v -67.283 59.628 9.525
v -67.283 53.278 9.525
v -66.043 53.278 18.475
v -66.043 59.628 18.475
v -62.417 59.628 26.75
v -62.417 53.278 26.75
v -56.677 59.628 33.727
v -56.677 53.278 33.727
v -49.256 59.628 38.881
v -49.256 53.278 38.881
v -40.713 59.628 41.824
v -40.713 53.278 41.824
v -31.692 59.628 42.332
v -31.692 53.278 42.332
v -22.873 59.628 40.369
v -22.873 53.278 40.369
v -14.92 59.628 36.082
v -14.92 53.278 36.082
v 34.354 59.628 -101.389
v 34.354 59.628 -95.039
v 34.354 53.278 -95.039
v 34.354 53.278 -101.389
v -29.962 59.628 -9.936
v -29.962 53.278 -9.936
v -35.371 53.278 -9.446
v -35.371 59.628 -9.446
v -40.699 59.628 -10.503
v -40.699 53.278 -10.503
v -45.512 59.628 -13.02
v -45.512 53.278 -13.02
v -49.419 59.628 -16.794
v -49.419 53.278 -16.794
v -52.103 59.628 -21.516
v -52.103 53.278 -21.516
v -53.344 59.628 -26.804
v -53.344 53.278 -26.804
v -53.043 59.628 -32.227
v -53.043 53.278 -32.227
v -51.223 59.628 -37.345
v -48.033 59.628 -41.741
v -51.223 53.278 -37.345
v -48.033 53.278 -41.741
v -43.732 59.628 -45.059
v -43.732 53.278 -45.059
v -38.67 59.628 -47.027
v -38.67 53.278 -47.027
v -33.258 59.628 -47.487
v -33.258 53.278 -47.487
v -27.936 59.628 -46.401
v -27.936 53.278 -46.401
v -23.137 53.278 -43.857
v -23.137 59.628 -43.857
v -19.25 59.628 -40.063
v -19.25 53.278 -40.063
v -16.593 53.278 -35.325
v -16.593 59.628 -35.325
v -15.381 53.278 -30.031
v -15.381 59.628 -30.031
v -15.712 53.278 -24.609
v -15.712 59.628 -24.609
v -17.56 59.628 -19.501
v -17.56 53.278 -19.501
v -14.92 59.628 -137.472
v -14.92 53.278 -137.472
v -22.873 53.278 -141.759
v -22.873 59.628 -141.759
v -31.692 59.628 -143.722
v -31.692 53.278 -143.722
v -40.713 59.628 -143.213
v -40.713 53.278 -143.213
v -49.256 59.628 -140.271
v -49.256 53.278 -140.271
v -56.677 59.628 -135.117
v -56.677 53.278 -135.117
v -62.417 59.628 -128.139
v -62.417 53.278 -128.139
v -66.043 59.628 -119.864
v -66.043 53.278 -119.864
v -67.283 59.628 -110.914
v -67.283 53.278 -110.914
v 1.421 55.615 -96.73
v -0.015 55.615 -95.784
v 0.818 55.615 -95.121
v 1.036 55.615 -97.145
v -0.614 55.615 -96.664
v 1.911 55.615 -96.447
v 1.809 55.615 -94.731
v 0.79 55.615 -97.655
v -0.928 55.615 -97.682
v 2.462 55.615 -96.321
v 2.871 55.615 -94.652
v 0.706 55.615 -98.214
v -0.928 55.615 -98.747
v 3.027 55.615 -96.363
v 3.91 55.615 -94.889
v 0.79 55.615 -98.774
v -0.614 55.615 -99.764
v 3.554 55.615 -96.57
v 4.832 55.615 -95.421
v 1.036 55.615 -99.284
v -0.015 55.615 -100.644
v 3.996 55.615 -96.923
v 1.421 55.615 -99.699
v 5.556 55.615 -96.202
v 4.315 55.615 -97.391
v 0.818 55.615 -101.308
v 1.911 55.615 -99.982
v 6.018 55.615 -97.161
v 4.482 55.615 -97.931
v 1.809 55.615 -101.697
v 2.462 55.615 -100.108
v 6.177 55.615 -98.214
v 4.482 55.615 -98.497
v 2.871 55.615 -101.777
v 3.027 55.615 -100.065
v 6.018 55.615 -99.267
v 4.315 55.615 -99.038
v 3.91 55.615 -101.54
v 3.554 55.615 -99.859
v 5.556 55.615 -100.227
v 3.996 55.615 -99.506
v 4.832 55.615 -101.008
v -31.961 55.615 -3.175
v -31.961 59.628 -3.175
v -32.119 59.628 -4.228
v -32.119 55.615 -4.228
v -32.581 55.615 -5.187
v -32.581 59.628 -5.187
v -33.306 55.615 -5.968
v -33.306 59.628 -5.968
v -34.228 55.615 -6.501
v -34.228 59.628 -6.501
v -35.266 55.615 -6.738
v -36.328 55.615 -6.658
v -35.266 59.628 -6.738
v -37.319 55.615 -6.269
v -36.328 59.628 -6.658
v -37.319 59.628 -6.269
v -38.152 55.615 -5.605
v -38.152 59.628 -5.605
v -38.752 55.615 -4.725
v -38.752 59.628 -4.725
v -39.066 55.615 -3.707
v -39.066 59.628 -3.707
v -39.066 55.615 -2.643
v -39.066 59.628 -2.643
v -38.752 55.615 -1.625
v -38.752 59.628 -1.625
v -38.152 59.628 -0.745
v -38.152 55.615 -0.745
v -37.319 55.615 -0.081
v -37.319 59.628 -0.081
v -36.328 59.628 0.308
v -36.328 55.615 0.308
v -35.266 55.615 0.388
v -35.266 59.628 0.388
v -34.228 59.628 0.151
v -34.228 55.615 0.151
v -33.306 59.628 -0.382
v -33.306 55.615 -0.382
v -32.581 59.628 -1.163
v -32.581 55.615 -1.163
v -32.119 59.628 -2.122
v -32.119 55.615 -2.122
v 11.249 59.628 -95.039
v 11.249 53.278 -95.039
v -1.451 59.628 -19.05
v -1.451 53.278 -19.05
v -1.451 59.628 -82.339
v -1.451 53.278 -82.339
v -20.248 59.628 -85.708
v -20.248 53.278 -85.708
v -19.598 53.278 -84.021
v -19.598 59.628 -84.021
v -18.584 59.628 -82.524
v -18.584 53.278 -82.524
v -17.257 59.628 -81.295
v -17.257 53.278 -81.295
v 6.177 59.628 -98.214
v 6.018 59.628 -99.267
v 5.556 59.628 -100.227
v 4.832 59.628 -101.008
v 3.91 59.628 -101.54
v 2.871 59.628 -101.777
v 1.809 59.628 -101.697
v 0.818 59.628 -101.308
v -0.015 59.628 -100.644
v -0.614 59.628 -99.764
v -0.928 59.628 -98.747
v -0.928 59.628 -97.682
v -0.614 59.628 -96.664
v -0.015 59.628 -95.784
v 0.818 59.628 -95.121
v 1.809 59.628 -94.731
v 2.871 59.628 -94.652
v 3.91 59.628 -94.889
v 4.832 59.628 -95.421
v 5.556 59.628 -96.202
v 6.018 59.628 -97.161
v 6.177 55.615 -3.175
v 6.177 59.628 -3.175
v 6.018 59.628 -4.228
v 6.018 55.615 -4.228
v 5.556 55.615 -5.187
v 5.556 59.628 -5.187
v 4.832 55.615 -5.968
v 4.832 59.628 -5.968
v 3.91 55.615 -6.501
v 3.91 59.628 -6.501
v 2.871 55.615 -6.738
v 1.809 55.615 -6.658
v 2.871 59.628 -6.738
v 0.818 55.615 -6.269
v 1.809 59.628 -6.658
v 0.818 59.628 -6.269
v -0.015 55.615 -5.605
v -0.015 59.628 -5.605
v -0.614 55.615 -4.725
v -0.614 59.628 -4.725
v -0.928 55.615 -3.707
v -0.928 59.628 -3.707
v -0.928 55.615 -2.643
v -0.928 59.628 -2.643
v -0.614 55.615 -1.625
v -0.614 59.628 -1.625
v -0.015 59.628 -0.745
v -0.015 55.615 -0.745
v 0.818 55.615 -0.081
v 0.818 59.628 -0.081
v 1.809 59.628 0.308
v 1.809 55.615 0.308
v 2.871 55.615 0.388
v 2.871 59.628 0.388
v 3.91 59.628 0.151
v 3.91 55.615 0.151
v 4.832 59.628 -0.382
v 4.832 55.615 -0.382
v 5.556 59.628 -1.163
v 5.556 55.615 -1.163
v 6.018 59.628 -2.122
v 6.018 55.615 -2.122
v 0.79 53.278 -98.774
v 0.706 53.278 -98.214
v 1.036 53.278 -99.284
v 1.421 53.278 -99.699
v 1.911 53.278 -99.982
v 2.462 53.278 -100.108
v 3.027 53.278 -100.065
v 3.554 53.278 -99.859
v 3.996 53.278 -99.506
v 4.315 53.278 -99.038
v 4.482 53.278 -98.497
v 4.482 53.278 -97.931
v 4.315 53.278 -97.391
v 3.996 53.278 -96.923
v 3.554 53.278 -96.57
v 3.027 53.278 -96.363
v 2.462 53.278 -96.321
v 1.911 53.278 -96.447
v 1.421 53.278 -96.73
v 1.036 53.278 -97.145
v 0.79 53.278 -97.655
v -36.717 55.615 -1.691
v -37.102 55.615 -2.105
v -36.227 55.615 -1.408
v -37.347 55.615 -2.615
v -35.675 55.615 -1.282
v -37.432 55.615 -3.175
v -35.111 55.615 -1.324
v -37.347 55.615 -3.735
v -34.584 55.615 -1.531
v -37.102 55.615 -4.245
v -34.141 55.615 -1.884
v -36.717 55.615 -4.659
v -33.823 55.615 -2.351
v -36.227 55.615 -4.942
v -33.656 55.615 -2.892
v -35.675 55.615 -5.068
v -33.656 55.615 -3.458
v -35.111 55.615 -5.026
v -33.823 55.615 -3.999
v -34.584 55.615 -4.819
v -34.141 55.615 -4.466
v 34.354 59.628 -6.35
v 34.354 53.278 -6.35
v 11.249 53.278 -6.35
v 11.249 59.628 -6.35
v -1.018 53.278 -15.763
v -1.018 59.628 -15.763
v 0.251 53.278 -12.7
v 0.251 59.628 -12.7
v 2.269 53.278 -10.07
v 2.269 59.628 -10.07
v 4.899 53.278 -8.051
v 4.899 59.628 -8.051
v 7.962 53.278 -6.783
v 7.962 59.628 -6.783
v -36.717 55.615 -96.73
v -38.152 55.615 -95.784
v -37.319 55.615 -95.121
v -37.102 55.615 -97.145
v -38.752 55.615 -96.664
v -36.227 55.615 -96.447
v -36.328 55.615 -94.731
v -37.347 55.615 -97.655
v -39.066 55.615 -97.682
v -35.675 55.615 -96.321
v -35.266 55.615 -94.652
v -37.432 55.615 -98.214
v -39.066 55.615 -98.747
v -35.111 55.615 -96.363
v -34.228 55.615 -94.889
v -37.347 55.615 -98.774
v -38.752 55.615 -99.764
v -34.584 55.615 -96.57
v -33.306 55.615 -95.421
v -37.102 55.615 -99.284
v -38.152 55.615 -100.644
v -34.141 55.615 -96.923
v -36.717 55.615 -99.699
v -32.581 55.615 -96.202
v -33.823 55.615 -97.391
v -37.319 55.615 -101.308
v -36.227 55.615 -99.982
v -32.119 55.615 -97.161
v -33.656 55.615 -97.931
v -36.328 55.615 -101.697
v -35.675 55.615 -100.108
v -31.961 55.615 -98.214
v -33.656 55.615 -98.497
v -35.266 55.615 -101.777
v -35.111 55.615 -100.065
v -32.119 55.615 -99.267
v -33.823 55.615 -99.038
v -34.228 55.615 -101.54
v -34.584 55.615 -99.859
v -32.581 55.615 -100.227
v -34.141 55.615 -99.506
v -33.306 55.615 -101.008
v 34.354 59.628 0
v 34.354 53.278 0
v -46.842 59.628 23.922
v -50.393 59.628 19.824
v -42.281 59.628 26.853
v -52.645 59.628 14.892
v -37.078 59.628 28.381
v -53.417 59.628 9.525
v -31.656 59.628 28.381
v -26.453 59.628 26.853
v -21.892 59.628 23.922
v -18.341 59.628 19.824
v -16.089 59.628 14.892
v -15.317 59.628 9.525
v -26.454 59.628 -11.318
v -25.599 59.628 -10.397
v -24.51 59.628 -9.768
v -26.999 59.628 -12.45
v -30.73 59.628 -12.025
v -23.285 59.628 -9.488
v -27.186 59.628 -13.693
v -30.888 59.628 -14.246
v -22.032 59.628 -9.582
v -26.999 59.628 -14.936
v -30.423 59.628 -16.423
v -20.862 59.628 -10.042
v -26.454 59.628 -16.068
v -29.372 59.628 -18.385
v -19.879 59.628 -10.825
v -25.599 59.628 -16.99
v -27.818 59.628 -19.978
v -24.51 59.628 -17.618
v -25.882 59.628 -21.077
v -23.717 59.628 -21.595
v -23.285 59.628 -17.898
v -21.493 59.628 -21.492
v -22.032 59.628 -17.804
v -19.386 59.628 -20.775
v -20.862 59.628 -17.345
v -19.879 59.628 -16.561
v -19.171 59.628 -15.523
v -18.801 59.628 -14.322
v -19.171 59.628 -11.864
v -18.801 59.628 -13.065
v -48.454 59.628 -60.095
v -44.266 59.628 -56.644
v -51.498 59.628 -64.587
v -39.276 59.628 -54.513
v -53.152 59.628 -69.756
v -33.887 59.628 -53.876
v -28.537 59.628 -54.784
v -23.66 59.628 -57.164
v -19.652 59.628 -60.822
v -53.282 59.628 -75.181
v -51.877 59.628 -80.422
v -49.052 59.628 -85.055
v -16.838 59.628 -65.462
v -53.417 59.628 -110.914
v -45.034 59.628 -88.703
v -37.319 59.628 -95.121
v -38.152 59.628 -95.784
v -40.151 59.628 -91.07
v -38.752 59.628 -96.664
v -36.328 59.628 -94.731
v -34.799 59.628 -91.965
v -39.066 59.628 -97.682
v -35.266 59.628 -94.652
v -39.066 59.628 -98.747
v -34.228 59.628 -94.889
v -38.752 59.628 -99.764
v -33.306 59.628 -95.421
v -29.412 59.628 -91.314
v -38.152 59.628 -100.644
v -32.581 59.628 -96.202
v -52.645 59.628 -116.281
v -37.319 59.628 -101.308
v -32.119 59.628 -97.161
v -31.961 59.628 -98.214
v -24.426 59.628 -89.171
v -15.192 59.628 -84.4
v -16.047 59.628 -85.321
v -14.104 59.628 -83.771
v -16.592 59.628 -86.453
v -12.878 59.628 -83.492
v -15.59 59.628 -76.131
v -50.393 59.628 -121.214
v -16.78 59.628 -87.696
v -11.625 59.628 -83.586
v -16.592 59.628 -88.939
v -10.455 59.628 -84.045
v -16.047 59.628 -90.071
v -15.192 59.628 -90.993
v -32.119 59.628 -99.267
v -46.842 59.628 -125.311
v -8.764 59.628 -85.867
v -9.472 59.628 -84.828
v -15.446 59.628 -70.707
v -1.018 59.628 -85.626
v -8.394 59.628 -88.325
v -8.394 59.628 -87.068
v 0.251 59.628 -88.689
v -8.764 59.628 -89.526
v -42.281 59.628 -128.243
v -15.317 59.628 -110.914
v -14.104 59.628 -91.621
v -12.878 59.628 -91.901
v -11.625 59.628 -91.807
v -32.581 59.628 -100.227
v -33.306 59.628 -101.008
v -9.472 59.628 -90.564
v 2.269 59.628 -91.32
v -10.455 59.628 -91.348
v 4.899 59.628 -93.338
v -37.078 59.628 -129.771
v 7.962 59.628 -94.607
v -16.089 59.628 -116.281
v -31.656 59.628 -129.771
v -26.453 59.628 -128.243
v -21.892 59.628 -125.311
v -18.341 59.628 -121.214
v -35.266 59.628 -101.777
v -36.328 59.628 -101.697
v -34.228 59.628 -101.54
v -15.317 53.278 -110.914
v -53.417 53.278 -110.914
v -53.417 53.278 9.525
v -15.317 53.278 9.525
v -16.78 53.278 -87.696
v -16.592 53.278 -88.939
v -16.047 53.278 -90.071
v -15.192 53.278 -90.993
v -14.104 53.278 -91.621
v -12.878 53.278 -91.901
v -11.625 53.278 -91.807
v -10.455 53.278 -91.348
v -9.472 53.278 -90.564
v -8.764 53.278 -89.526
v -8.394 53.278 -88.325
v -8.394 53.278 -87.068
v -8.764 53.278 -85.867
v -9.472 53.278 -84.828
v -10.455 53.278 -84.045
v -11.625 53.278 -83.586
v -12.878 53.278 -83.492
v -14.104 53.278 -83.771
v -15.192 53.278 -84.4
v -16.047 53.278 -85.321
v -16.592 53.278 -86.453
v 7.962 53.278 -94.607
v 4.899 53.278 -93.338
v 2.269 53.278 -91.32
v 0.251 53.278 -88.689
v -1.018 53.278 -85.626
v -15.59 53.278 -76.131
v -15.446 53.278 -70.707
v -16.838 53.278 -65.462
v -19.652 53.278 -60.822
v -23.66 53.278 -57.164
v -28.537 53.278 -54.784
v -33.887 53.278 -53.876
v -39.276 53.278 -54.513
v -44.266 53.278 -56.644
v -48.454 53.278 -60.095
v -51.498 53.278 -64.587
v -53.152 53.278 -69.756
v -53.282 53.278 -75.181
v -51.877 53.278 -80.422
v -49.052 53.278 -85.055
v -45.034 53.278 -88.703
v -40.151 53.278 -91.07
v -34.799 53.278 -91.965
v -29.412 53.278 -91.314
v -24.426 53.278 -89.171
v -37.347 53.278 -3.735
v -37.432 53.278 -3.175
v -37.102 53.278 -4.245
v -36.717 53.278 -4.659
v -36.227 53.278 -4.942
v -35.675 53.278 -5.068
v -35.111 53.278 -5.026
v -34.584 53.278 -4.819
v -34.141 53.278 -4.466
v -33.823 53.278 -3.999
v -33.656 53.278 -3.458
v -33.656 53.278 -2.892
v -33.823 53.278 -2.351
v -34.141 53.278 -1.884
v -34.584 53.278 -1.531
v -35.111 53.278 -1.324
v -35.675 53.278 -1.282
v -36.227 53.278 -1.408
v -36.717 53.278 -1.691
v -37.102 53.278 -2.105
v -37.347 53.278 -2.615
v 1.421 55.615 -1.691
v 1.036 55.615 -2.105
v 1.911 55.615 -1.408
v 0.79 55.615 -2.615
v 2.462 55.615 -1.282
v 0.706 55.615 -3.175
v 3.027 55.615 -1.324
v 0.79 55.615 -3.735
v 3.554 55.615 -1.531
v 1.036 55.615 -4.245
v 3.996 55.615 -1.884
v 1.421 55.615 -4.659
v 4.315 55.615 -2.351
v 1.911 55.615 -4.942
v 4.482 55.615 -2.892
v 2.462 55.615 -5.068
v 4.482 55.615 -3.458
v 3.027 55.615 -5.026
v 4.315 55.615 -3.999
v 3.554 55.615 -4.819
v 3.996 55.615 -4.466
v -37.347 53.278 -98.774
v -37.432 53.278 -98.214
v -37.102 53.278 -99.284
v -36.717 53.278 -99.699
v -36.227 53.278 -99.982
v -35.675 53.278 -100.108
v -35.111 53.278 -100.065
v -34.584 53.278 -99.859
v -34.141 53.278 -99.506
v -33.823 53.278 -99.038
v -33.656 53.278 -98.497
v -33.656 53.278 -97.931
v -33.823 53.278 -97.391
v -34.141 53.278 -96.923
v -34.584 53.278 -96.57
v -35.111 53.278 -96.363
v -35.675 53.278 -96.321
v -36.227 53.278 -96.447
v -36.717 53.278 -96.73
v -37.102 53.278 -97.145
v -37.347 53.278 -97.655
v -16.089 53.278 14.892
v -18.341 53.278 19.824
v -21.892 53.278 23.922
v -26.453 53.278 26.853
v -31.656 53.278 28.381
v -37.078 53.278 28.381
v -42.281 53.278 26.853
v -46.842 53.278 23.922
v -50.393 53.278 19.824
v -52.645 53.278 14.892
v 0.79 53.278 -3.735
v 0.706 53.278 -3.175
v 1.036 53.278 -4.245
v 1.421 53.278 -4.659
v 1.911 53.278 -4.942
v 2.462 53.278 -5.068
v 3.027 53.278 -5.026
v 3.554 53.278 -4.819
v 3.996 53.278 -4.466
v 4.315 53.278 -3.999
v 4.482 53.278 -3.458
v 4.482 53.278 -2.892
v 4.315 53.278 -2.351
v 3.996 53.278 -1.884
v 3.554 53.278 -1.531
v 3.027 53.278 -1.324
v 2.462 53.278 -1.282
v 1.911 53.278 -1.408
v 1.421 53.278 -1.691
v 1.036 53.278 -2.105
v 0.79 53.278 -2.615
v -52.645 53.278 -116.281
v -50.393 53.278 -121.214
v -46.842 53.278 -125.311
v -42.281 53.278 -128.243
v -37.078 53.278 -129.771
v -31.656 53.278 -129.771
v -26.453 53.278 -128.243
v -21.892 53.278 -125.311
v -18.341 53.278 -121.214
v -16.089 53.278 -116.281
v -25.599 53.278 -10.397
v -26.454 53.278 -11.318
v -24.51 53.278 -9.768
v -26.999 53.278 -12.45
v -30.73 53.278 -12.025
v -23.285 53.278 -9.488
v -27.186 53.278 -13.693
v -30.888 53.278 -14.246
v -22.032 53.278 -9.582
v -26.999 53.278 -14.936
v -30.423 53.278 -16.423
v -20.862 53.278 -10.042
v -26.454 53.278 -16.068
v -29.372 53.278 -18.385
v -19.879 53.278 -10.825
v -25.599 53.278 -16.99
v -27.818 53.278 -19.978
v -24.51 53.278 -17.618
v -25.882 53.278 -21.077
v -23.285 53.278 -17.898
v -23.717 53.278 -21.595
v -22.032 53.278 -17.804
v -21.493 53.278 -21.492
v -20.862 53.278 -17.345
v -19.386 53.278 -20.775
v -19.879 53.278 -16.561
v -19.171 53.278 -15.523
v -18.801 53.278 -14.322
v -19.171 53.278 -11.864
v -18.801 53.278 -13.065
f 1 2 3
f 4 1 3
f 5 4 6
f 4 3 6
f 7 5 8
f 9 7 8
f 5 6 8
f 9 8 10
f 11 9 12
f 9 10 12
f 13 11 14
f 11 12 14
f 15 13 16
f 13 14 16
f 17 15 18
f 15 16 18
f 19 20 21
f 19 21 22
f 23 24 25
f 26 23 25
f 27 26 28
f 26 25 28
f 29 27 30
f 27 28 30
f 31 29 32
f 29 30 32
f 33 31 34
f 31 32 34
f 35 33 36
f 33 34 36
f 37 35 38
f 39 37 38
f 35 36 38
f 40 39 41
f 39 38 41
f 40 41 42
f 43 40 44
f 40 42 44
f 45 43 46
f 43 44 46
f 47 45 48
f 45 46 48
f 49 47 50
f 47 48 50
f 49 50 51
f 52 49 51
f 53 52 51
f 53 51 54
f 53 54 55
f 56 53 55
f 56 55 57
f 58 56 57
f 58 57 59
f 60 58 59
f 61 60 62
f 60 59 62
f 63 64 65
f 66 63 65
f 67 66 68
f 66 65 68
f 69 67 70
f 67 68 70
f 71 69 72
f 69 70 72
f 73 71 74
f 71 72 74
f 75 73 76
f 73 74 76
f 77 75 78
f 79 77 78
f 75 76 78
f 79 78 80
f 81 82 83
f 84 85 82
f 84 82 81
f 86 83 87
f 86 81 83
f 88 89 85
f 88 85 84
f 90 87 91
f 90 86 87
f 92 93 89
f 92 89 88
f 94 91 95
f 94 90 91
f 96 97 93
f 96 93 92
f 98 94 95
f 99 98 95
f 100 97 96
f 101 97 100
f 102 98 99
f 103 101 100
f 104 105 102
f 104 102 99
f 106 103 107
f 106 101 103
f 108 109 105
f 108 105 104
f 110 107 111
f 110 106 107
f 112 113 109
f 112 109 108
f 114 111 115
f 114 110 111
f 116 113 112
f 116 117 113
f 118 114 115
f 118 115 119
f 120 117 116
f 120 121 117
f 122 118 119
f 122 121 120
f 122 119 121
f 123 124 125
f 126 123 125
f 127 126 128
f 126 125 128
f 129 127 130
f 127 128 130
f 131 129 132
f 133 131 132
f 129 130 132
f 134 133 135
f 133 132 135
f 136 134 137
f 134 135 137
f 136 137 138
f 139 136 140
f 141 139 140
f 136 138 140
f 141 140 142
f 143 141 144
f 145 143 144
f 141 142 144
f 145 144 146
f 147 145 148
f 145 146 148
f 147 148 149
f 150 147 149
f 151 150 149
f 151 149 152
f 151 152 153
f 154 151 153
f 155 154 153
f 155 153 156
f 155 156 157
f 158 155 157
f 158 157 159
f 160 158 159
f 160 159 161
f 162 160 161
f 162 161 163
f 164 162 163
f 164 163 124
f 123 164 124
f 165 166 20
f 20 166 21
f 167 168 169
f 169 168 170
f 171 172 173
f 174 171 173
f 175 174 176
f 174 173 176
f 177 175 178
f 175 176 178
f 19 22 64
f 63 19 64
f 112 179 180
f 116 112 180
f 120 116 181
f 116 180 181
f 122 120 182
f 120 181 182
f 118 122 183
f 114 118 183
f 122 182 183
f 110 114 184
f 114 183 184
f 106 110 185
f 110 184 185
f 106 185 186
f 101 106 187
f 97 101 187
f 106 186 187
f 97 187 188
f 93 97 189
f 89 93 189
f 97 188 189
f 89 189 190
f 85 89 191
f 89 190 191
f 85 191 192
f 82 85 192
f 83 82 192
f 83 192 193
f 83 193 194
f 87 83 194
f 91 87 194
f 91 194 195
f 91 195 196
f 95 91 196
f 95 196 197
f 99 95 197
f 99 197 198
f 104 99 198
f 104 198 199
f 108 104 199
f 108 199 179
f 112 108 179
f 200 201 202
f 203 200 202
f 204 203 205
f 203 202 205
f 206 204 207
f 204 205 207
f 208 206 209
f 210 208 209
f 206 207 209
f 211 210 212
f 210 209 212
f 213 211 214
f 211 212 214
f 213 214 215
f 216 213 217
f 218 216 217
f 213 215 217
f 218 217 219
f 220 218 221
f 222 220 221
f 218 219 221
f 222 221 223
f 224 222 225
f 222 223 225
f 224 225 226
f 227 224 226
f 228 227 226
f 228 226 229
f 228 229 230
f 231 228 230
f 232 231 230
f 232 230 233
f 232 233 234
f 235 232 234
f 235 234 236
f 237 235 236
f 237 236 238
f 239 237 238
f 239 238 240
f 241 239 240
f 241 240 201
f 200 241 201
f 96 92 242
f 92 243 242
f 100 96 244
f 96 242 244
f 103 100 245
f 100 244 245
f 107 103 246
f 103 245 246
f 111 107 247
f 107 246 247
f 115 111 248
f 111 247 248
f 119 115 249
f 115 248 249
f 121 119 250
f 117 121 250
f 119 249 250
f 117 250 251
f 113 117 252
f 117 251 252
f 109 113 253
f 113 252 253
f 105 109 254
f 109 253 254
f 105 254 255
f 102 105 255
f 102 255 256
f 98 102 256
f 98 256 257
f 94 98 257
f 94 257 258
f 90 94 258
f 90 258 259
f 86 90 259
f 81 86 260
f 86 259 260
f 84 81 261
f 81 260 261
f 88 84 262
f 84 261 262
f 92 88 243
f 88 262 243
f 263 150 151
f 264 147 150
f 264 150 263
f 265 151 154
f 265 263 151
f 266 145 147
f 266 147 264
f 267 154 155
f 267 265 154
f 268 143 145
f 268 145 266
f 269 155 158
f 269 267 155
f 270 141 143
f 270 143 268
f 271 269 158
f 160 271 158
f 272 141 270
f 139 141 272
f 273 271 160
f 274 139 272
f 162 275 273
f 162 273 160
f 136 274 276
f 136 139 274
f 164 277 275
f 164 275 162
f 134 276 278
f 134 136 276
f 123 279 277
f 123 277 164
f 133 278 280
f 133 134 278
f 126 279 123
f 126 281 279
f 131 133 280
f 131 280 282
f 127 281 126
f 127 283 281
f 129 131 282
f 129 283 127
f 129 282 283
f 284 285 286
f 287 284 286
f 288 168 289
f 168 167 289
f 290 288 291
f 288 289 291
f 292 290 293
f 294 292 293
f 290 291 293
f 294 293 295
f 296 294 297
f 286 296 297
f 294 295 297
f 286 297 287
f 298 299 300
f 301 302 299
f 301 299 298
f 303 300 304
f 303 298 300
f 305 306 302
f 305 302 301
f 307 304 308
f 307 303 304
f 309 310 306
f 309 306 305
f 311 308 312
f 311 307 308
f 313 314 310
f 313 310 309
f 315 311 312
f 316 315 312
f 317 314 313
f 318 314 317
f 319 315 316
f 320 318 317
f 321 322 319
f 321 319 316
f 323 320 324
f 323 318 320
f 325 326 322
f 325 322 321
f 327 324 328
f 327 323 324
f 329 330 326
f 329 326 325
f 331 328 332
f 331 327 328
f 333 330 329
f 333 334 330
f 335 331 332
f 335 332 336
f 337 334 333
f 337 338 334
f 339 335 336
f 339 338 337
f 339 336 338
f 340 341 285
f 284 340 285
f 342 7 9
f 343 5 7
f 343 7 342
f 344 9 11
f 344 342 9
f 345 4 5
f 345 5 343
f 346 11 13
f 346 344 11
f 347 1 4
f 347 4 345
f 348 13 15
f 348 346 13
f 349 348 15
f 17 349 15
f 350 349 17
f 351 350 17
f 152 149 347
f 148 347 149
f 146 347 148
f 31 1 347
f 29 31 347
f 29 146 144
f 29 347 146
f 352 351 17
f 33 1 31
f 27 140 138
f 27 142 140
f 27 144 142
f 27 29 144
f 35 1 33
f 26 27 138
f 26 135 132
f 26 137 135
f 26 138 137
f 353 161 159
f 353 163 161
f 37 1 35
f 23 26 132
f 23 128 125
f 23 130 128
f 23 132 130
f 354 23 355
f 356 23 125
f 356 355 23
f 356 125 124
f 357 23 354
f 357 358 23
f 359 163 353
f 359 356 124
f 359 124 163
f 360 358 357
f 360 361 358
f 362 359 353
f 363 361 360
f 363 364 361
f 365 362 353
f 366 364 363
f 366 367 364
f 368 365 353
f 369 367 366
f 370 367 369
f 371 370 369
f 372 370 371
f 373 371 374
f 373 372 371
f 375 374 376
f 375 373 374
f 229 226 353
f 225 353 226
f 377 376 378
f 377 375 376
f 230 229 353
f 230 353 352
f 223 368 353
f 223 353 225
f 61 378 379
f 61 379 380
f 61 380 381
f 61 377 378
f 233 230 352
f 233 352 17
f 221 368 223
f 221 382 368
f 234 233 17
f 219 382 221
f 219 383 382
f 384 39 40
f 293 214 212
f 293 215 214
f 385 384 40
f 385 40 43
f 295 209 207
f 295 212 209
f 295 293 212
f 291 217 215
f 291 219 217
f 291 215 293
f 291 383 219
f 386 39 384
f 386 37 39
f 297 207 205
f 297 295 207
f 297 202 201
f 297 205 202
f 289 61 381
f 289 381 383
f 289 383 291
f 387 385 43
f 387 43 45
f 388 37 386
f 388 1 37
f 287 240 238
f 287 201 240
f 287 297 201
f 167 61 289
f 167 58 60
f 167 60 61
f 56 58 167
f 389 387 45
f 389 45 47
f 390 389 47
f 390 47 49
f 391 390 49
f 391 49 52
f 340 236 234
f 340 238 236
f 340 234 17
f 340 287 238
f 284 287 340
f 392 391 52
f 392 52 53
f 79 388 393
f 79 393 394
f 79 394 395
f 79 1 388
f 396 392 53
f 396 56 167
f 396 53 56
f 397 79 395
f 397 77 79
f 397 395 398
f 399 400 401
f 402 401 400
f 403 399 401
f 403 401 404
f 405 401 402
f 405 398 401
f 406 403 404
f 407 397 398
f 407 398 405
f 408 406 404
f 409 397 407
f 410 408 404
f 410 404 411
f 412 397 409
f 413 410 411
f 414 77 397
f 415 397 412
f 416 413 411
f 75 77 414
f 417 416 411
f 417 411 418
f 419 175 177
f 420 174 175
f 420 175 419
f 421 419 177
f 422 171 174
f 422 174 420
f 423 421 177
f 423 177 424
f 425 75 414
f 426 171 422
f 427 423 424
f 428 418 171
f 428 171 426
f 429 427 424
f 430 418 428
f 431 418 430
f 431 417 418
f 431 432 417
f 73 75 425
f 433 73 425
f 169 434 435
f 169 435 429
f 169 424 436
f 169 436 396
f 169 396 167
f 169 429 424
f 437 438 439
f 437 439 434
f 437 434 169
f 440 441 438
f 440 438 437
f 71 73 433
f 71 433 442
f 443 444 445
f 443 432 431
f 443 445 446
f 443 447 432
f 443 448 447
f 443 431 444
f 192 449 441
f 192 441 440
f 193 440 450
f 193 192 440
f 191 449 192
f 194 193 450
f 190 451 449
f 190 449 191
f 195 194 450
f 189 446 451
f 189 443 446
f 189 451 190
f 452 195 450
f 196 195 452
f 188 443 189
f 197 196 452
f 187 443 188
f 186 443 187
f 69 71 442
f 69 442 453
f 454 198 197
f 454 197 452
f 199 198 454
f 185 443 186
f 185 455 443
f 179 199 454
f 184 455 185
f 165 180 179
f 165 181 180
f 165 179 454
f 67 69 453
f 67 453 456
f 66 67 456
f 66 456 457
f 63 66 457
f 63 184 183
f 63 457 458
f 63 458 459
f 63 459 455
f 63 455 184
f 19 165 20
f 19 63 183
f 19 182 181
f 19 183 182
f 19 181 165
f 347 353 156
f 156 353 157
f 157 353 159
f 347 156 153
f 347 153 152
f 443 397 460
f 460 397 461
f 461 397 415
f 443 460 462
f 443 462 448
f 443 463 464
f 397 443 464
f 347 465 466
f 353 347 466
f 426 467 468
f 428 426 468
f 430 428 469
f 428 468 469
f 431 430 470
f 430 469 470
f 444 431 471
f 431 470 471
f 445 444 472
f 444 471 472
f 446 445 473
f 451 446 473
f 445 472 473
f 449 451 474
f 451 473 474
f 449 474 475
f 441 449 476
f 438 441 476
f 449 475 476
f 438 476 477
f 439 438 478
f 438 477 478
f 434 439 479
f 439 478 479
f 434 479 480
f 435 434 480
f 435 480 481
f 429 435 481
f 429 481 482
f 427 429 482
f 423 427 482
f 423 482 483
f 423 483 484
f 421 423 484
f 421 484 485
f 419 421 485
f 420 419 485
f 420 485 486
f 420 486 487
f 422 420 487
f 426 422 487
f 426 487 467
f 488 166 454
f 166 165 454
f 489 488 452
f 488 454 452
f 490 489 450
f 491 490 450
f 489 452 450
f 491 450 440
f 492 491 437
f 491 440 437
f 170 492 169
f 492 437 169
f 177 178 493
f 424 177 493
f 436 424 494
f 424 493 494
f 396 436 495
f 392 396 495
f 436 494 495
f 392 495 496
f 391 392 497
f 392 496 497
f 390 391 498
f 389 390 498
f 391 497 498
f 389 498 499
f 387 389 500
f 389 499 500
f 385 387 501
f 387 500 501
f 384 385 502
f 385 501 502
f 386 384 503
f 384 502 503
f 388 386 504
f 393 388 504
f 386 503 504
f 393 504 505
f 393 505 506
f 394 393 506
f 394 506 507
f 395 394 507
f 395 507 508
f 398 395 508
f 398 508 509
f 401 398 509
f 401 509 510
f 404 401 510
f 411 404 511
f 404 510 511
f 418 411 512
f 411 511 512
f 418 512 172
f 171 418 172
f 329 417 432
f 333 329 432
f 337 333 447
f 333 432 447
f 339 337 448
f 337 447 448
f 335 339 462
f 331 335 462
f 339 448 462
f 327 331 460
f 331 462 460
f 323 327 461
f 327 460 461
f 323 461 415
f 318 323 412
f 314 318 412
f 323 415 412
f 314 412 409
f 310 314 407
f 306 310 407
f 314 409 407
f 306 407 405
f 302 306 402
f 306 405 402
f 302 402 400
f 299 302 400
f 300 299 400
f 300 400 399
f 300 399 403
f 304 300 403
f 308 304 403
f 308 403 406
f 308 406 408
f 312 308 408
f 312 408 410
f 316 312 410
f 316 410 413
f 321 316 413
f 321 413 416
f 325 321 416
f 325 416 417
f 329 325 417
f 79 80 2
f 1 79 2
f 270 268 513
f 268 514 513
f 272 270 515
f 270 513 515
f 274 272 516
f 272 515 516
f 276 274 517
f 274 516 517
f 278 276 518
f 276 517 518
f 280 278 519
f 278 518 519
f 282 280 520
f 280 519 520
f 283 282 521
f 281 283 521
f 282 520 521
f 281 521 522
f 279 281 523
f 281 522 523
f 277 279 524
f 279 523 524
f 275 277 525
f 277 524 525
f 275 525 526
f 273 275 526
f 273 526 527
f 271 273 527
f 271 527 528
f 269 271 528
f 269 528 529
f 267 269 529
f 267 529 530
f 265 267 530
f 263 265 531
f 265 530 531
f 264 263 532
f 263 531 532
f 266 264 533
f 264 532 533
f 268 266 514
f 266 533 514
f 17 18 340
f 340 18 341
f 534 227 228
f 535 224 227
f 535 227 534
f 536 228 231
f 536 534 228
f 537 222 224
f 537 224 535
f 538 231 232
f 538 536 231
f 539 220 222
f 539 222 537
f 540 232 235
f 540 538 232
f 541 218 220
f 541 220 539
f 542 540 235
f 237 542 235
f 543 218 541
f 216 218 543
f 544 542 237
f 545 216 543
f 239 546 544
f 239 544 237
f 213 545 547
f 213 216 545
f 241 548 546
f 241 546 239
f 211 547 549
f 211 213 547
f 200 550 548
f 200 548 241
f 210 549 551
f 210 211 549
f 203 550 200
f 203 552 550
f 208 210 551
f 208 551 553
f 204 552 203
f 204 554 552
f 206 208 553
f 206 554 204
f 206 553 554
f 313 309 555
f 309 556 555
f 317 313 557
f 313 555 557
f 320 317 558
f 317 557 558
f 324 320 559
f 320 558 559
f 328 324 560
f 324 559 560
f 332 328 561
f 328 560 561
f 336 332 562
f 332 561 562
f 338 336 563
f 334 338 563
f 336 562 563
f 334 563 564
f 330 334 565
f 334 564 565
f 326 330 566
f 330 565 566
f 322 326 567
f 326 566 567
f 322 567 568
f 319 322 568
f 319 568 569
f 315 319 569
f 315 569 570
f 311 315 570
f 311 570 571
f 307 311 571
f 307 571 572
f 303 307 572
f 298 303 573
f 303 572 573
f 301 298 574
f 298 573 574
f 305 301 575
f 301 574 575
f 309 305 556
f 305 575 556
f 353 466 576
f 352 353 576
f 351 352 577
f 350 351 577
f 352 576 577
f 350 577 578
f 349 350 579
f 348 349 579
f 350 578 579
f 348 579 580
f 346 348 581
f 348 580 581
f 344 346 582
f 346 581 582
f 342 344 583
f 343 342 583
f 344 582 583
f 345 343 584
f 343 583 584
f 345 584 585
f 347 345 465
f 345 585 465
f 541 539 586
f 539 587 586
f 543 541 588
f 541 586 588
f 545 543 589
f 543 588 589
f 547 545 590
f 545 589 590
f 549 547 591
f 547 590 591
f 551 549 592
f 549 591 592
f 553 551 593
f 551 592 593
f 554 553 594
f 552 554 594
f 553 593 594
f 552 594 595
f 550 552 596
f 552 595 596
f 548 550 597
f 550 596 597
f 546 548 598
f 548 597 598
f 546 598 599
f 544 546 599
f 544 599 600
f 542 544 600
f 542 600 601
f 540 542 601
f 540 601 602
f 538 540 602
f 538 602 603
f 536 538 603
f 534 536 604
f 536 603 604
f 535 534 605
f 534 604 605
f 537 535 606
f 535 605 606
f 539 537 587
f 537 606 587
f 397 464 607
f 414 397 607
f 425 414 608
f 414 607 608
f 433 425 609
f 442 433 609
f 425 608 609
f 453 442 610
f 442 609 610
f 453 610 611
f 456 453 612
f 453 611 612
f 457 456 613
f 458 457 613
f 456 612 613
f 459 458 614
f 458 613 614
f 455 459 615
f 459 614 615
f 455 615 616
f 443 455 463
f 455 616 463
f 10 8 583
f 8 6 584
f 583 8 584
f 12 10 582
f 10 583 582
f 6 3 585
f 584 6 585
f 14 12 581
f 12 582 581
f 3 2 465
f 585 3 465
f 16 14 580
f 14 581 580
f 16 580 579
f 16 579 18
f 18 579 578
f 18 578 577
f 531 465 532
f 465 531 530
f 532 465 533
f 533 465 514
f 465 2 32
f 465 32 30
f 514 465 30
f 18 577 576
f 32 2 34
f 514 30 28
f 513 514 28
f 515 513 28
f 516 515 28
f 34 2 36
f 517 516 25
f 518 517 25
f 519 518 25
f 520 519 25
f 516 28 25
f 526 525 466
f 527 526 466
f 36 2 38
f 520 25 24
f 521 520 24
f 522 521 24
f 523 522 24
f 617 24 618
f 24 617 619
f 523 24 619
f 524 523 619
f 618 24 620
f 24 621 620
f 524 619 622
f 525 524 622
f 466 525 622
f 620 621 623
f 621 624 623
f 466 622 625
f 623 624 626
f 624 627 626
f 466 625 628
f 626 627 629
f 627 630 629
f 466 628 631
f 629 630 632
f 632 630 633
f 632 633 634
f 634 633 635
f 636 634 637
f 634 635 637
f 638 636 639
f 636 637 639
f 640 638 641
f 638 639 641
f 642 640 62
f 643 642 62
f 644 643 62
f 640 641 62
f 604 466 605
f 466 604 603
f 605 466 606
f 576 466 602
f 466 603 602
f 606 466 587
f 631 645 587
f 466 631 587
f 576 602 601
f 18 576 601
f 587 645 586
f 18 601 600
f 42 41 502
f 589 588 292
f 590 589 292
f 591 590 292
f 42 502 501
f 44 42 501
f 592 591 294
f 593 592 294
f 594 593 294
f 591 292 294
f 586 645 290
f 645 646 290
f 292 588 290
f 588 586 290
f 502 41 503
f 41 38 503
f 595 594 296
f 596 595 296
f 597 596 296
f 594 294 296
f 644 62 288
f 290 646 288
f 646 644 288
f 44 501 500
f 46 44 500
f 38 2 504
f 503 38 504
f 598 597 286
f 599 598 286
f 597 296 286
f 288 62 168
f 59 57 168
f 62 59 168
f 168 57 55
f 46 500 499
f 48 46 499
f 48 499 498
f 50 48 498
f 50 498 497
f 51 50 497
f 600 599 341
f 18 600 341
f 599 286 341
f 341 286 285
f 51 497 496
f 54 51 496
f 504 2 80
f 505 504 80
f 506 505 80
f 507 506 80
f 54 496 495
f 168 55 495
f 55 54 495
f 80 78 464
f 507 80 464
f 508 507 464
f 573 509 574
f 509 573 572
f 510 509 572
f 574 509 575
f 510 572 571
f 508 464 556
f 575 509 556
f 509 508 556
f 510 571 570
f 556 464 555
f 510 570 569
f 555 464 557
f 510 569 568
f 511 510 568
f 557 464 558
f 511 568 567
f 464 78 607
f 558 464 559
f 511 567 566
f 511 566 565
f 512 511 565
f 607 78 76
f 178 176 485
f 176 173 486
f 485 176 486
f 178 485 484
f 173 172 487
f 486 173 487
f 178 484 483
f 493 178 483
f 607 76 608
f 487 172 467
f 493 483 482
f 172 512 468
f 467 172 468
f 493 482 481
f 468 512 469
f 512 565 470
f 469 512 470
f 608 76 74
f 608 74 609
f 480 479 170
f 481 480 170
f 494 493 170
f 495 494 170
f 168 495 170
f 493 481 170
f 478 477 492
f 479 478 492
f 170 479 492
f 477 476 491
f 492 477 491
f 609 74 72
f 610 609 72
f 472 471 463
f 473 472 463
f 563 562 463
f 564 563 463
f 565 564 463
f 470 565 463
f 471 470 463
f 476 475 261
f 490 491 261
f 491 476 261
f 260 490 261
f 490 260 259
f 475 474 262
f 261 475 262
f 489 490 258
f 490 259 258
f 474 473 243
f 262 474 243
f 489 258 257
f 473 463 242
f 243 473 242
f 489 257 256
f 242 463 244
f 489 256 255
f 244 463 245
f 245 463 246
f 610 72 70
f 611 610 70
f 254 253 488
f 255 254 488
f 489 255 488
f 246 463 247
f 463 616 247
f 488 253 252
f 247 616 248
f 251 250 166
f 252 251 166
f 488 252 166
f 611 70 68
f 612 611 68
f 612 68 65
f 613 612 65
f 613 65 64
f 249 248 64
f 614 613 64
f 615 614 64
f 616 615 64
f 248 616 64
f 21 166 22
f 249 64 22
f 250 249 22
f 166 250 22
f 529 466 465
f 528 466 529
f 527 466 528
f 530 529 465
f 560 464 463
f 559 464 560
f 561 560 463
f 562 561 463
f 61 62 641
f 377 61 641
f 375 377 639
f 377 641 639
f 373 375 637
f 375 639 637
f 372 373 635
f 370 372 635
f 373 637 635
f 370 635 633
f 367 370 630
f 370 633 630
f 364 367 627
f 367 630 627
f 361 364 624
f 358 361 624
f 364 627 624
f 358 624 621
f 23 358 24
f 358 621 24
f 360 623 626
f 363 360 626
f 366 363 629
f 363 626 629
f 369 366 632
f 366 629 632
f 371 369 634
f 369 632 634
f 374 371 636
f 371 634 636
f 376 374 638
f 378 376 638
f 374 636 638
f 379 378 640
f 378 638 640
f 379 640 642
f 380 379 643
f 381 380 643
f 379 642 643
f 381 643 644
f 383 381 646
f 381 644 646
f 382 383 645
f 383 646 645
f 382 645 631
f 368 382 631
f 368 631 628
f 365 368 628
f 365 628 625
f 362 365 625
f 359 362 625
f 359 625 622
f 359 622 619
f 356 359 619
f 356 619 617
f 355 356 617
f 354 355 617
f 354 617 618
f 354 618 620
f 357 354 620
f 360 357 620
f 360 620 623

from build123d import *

# Parameters (mm, degrees)
BOSS_EXTRUDE1_DEPTH                            = 6.35
FILLET1_R                                      = 12.7
TAP_DRILL_FOR_3_8_24_TAP1_D                    = 8.4328
CBORE_FOR_6_SOCKET_HEAD_CAP_SCREW1_D           = 3.7973
CBORE_FOR_6_SOCKET_HEAD_CAP_SCREW1_CBORE_D     = 7.14502
CBORE_FOR_6_SOCKET_HEAD_CAP_SCREW1_CBORE_DEPTH = 4.0132


with BuildPart() as part:
    # Sketch1 → Boss-Extrude1 (new body)
    with BuildSketch(Plane(origin=(0, 53.278467802, 0), x_dir=(1, 0, 0), z_dir=(0, 1, 0))):
        with BuildLine():
            ThreePointArc((-14.919754069, 137.471595351), (-49.255675468, 140.270872374), (-67.283137827, 110.914407139))
            Line((-67.283137827, 110.914407139), (-67.283137827, -9.525))
            ThreePointArc((-67.283137827, -9.525), (-49.255676138, -38.881464895), (-14.919755281, -36.0821891))
            Line((-14.919755281, -36.0821891), (34.354322218, 0))
            Line((34.354322218, 0), (34.354322218, 6.35))
            Line((34.354322218, 6.35), (-1.450719122, 6.35))
            Line((-1.450719122, 6.35), (-1.450719122, 95.039403682))
            Line((-1.450719122, 95.039403682), (34.354322218, 95.039403682))
            Line((34.354322218, 95.039403682), (34.354322218, 101.389403682))
            Line((34.354322218, 101.389403682), (-14.919754069, 137.471595351))
        make_face()
        with BuildLine():
            Line((-53.416928475, -9.525), (-34.366928475, -9.525))
            Line((-34.366928475, -9.525), (-15.316928475, -9.525))
            ThreePointArc((-15.316928475, -9.525), (-34.366928475, -28.575), (-53.416928475, -9.525))
        make_face(mode=Mode.SUBTRACT)
        with BuildLine():
            ThreePointArc((-29.961916932, 9.935994461), (-46.001401892, 43.554183286), (-17.560004644, 19.501436661))
            ThreePointArc((-17.560004644, 19.501436661), (-27.817615961, 19.978303209), (-29.961916932, 9.935994461))
        make_face(mode=Mode.SUBTRACT)
        with BuildLine():
            ThreePointArc((-17.256926776, 81.295283661), (-50.136649325, 62.232402493), (-20.247770765, 85.708444148))
            ThreePointArc((-20.247770765, 85.708444148), (-19.133936144, 83.24325824), (-17.256926776, 81.295283661))
        make_face(mode=Mode.SUBTRACT)
        with BuildLine():
            Line((-34.366928475, 110.914407139), (-53.416928475, 110.914407139))
            ThreePointArc((-53.416928475, 110.914407139), (-34.366928475, 129.964407139), (-15.316928475, 110.914407139))
            Line((-15.316928475, 110.914407139), (-34.366928475, 110.914407139))
        make_face(mode=Mode.SUBTRACT)
    extrude(amount=BOSS_EXTRUDE1_DEPTH)

    # Fillet1
    fillet1_edges = [part.edges().sort_by_distance(p)[0] for p in [
        (-1.450719122, 56.453467802, -6.35),
        (-1.450719122, 56.453467802, -95.039403682),
    ]]
    fillet(fillet1_edges, radius=FILLET1_R)

    # Tap Drill for 3/8-24 Tap1 (through all)
    with Locations(Plane(origin=(0, 59.628467802, 0), x_dir=(1, 0, 0), z_dir=(0, 1, 0))):
        with Locations((-22.969918704, 13.693103328), (-12.563219122, 87.696300355)):
            Hole(TAP_DRILL_FOR_3_8_24_TAP1_D / 2)

    # CBORE for #6 Socket Head Cap Screw1 (through all)
    with Locations(Plane(origin=(0, 59.628467802, 0), x_dir=(1, 0, 0), z_dir=(0, 1, 0))):
        with Locations((2.604322218, 3.175), (-35.533137827, 3.175), (-35.533137827, 98.214403682), (2.604322218, 98.214403682)):
            CounterBoreHole(CBORE_FOR_6_SOCKET_HEAD_CAP_SCREW1_D / 2, CBORE_FOR_6_SOCKET_HEAD_CAP_SCREW1_CBORE_D / 2, CBORE_FOR_6_SOCKET_HEAD_CAP_SCREW1_CBORE_DEPTH)


solid = part.part
